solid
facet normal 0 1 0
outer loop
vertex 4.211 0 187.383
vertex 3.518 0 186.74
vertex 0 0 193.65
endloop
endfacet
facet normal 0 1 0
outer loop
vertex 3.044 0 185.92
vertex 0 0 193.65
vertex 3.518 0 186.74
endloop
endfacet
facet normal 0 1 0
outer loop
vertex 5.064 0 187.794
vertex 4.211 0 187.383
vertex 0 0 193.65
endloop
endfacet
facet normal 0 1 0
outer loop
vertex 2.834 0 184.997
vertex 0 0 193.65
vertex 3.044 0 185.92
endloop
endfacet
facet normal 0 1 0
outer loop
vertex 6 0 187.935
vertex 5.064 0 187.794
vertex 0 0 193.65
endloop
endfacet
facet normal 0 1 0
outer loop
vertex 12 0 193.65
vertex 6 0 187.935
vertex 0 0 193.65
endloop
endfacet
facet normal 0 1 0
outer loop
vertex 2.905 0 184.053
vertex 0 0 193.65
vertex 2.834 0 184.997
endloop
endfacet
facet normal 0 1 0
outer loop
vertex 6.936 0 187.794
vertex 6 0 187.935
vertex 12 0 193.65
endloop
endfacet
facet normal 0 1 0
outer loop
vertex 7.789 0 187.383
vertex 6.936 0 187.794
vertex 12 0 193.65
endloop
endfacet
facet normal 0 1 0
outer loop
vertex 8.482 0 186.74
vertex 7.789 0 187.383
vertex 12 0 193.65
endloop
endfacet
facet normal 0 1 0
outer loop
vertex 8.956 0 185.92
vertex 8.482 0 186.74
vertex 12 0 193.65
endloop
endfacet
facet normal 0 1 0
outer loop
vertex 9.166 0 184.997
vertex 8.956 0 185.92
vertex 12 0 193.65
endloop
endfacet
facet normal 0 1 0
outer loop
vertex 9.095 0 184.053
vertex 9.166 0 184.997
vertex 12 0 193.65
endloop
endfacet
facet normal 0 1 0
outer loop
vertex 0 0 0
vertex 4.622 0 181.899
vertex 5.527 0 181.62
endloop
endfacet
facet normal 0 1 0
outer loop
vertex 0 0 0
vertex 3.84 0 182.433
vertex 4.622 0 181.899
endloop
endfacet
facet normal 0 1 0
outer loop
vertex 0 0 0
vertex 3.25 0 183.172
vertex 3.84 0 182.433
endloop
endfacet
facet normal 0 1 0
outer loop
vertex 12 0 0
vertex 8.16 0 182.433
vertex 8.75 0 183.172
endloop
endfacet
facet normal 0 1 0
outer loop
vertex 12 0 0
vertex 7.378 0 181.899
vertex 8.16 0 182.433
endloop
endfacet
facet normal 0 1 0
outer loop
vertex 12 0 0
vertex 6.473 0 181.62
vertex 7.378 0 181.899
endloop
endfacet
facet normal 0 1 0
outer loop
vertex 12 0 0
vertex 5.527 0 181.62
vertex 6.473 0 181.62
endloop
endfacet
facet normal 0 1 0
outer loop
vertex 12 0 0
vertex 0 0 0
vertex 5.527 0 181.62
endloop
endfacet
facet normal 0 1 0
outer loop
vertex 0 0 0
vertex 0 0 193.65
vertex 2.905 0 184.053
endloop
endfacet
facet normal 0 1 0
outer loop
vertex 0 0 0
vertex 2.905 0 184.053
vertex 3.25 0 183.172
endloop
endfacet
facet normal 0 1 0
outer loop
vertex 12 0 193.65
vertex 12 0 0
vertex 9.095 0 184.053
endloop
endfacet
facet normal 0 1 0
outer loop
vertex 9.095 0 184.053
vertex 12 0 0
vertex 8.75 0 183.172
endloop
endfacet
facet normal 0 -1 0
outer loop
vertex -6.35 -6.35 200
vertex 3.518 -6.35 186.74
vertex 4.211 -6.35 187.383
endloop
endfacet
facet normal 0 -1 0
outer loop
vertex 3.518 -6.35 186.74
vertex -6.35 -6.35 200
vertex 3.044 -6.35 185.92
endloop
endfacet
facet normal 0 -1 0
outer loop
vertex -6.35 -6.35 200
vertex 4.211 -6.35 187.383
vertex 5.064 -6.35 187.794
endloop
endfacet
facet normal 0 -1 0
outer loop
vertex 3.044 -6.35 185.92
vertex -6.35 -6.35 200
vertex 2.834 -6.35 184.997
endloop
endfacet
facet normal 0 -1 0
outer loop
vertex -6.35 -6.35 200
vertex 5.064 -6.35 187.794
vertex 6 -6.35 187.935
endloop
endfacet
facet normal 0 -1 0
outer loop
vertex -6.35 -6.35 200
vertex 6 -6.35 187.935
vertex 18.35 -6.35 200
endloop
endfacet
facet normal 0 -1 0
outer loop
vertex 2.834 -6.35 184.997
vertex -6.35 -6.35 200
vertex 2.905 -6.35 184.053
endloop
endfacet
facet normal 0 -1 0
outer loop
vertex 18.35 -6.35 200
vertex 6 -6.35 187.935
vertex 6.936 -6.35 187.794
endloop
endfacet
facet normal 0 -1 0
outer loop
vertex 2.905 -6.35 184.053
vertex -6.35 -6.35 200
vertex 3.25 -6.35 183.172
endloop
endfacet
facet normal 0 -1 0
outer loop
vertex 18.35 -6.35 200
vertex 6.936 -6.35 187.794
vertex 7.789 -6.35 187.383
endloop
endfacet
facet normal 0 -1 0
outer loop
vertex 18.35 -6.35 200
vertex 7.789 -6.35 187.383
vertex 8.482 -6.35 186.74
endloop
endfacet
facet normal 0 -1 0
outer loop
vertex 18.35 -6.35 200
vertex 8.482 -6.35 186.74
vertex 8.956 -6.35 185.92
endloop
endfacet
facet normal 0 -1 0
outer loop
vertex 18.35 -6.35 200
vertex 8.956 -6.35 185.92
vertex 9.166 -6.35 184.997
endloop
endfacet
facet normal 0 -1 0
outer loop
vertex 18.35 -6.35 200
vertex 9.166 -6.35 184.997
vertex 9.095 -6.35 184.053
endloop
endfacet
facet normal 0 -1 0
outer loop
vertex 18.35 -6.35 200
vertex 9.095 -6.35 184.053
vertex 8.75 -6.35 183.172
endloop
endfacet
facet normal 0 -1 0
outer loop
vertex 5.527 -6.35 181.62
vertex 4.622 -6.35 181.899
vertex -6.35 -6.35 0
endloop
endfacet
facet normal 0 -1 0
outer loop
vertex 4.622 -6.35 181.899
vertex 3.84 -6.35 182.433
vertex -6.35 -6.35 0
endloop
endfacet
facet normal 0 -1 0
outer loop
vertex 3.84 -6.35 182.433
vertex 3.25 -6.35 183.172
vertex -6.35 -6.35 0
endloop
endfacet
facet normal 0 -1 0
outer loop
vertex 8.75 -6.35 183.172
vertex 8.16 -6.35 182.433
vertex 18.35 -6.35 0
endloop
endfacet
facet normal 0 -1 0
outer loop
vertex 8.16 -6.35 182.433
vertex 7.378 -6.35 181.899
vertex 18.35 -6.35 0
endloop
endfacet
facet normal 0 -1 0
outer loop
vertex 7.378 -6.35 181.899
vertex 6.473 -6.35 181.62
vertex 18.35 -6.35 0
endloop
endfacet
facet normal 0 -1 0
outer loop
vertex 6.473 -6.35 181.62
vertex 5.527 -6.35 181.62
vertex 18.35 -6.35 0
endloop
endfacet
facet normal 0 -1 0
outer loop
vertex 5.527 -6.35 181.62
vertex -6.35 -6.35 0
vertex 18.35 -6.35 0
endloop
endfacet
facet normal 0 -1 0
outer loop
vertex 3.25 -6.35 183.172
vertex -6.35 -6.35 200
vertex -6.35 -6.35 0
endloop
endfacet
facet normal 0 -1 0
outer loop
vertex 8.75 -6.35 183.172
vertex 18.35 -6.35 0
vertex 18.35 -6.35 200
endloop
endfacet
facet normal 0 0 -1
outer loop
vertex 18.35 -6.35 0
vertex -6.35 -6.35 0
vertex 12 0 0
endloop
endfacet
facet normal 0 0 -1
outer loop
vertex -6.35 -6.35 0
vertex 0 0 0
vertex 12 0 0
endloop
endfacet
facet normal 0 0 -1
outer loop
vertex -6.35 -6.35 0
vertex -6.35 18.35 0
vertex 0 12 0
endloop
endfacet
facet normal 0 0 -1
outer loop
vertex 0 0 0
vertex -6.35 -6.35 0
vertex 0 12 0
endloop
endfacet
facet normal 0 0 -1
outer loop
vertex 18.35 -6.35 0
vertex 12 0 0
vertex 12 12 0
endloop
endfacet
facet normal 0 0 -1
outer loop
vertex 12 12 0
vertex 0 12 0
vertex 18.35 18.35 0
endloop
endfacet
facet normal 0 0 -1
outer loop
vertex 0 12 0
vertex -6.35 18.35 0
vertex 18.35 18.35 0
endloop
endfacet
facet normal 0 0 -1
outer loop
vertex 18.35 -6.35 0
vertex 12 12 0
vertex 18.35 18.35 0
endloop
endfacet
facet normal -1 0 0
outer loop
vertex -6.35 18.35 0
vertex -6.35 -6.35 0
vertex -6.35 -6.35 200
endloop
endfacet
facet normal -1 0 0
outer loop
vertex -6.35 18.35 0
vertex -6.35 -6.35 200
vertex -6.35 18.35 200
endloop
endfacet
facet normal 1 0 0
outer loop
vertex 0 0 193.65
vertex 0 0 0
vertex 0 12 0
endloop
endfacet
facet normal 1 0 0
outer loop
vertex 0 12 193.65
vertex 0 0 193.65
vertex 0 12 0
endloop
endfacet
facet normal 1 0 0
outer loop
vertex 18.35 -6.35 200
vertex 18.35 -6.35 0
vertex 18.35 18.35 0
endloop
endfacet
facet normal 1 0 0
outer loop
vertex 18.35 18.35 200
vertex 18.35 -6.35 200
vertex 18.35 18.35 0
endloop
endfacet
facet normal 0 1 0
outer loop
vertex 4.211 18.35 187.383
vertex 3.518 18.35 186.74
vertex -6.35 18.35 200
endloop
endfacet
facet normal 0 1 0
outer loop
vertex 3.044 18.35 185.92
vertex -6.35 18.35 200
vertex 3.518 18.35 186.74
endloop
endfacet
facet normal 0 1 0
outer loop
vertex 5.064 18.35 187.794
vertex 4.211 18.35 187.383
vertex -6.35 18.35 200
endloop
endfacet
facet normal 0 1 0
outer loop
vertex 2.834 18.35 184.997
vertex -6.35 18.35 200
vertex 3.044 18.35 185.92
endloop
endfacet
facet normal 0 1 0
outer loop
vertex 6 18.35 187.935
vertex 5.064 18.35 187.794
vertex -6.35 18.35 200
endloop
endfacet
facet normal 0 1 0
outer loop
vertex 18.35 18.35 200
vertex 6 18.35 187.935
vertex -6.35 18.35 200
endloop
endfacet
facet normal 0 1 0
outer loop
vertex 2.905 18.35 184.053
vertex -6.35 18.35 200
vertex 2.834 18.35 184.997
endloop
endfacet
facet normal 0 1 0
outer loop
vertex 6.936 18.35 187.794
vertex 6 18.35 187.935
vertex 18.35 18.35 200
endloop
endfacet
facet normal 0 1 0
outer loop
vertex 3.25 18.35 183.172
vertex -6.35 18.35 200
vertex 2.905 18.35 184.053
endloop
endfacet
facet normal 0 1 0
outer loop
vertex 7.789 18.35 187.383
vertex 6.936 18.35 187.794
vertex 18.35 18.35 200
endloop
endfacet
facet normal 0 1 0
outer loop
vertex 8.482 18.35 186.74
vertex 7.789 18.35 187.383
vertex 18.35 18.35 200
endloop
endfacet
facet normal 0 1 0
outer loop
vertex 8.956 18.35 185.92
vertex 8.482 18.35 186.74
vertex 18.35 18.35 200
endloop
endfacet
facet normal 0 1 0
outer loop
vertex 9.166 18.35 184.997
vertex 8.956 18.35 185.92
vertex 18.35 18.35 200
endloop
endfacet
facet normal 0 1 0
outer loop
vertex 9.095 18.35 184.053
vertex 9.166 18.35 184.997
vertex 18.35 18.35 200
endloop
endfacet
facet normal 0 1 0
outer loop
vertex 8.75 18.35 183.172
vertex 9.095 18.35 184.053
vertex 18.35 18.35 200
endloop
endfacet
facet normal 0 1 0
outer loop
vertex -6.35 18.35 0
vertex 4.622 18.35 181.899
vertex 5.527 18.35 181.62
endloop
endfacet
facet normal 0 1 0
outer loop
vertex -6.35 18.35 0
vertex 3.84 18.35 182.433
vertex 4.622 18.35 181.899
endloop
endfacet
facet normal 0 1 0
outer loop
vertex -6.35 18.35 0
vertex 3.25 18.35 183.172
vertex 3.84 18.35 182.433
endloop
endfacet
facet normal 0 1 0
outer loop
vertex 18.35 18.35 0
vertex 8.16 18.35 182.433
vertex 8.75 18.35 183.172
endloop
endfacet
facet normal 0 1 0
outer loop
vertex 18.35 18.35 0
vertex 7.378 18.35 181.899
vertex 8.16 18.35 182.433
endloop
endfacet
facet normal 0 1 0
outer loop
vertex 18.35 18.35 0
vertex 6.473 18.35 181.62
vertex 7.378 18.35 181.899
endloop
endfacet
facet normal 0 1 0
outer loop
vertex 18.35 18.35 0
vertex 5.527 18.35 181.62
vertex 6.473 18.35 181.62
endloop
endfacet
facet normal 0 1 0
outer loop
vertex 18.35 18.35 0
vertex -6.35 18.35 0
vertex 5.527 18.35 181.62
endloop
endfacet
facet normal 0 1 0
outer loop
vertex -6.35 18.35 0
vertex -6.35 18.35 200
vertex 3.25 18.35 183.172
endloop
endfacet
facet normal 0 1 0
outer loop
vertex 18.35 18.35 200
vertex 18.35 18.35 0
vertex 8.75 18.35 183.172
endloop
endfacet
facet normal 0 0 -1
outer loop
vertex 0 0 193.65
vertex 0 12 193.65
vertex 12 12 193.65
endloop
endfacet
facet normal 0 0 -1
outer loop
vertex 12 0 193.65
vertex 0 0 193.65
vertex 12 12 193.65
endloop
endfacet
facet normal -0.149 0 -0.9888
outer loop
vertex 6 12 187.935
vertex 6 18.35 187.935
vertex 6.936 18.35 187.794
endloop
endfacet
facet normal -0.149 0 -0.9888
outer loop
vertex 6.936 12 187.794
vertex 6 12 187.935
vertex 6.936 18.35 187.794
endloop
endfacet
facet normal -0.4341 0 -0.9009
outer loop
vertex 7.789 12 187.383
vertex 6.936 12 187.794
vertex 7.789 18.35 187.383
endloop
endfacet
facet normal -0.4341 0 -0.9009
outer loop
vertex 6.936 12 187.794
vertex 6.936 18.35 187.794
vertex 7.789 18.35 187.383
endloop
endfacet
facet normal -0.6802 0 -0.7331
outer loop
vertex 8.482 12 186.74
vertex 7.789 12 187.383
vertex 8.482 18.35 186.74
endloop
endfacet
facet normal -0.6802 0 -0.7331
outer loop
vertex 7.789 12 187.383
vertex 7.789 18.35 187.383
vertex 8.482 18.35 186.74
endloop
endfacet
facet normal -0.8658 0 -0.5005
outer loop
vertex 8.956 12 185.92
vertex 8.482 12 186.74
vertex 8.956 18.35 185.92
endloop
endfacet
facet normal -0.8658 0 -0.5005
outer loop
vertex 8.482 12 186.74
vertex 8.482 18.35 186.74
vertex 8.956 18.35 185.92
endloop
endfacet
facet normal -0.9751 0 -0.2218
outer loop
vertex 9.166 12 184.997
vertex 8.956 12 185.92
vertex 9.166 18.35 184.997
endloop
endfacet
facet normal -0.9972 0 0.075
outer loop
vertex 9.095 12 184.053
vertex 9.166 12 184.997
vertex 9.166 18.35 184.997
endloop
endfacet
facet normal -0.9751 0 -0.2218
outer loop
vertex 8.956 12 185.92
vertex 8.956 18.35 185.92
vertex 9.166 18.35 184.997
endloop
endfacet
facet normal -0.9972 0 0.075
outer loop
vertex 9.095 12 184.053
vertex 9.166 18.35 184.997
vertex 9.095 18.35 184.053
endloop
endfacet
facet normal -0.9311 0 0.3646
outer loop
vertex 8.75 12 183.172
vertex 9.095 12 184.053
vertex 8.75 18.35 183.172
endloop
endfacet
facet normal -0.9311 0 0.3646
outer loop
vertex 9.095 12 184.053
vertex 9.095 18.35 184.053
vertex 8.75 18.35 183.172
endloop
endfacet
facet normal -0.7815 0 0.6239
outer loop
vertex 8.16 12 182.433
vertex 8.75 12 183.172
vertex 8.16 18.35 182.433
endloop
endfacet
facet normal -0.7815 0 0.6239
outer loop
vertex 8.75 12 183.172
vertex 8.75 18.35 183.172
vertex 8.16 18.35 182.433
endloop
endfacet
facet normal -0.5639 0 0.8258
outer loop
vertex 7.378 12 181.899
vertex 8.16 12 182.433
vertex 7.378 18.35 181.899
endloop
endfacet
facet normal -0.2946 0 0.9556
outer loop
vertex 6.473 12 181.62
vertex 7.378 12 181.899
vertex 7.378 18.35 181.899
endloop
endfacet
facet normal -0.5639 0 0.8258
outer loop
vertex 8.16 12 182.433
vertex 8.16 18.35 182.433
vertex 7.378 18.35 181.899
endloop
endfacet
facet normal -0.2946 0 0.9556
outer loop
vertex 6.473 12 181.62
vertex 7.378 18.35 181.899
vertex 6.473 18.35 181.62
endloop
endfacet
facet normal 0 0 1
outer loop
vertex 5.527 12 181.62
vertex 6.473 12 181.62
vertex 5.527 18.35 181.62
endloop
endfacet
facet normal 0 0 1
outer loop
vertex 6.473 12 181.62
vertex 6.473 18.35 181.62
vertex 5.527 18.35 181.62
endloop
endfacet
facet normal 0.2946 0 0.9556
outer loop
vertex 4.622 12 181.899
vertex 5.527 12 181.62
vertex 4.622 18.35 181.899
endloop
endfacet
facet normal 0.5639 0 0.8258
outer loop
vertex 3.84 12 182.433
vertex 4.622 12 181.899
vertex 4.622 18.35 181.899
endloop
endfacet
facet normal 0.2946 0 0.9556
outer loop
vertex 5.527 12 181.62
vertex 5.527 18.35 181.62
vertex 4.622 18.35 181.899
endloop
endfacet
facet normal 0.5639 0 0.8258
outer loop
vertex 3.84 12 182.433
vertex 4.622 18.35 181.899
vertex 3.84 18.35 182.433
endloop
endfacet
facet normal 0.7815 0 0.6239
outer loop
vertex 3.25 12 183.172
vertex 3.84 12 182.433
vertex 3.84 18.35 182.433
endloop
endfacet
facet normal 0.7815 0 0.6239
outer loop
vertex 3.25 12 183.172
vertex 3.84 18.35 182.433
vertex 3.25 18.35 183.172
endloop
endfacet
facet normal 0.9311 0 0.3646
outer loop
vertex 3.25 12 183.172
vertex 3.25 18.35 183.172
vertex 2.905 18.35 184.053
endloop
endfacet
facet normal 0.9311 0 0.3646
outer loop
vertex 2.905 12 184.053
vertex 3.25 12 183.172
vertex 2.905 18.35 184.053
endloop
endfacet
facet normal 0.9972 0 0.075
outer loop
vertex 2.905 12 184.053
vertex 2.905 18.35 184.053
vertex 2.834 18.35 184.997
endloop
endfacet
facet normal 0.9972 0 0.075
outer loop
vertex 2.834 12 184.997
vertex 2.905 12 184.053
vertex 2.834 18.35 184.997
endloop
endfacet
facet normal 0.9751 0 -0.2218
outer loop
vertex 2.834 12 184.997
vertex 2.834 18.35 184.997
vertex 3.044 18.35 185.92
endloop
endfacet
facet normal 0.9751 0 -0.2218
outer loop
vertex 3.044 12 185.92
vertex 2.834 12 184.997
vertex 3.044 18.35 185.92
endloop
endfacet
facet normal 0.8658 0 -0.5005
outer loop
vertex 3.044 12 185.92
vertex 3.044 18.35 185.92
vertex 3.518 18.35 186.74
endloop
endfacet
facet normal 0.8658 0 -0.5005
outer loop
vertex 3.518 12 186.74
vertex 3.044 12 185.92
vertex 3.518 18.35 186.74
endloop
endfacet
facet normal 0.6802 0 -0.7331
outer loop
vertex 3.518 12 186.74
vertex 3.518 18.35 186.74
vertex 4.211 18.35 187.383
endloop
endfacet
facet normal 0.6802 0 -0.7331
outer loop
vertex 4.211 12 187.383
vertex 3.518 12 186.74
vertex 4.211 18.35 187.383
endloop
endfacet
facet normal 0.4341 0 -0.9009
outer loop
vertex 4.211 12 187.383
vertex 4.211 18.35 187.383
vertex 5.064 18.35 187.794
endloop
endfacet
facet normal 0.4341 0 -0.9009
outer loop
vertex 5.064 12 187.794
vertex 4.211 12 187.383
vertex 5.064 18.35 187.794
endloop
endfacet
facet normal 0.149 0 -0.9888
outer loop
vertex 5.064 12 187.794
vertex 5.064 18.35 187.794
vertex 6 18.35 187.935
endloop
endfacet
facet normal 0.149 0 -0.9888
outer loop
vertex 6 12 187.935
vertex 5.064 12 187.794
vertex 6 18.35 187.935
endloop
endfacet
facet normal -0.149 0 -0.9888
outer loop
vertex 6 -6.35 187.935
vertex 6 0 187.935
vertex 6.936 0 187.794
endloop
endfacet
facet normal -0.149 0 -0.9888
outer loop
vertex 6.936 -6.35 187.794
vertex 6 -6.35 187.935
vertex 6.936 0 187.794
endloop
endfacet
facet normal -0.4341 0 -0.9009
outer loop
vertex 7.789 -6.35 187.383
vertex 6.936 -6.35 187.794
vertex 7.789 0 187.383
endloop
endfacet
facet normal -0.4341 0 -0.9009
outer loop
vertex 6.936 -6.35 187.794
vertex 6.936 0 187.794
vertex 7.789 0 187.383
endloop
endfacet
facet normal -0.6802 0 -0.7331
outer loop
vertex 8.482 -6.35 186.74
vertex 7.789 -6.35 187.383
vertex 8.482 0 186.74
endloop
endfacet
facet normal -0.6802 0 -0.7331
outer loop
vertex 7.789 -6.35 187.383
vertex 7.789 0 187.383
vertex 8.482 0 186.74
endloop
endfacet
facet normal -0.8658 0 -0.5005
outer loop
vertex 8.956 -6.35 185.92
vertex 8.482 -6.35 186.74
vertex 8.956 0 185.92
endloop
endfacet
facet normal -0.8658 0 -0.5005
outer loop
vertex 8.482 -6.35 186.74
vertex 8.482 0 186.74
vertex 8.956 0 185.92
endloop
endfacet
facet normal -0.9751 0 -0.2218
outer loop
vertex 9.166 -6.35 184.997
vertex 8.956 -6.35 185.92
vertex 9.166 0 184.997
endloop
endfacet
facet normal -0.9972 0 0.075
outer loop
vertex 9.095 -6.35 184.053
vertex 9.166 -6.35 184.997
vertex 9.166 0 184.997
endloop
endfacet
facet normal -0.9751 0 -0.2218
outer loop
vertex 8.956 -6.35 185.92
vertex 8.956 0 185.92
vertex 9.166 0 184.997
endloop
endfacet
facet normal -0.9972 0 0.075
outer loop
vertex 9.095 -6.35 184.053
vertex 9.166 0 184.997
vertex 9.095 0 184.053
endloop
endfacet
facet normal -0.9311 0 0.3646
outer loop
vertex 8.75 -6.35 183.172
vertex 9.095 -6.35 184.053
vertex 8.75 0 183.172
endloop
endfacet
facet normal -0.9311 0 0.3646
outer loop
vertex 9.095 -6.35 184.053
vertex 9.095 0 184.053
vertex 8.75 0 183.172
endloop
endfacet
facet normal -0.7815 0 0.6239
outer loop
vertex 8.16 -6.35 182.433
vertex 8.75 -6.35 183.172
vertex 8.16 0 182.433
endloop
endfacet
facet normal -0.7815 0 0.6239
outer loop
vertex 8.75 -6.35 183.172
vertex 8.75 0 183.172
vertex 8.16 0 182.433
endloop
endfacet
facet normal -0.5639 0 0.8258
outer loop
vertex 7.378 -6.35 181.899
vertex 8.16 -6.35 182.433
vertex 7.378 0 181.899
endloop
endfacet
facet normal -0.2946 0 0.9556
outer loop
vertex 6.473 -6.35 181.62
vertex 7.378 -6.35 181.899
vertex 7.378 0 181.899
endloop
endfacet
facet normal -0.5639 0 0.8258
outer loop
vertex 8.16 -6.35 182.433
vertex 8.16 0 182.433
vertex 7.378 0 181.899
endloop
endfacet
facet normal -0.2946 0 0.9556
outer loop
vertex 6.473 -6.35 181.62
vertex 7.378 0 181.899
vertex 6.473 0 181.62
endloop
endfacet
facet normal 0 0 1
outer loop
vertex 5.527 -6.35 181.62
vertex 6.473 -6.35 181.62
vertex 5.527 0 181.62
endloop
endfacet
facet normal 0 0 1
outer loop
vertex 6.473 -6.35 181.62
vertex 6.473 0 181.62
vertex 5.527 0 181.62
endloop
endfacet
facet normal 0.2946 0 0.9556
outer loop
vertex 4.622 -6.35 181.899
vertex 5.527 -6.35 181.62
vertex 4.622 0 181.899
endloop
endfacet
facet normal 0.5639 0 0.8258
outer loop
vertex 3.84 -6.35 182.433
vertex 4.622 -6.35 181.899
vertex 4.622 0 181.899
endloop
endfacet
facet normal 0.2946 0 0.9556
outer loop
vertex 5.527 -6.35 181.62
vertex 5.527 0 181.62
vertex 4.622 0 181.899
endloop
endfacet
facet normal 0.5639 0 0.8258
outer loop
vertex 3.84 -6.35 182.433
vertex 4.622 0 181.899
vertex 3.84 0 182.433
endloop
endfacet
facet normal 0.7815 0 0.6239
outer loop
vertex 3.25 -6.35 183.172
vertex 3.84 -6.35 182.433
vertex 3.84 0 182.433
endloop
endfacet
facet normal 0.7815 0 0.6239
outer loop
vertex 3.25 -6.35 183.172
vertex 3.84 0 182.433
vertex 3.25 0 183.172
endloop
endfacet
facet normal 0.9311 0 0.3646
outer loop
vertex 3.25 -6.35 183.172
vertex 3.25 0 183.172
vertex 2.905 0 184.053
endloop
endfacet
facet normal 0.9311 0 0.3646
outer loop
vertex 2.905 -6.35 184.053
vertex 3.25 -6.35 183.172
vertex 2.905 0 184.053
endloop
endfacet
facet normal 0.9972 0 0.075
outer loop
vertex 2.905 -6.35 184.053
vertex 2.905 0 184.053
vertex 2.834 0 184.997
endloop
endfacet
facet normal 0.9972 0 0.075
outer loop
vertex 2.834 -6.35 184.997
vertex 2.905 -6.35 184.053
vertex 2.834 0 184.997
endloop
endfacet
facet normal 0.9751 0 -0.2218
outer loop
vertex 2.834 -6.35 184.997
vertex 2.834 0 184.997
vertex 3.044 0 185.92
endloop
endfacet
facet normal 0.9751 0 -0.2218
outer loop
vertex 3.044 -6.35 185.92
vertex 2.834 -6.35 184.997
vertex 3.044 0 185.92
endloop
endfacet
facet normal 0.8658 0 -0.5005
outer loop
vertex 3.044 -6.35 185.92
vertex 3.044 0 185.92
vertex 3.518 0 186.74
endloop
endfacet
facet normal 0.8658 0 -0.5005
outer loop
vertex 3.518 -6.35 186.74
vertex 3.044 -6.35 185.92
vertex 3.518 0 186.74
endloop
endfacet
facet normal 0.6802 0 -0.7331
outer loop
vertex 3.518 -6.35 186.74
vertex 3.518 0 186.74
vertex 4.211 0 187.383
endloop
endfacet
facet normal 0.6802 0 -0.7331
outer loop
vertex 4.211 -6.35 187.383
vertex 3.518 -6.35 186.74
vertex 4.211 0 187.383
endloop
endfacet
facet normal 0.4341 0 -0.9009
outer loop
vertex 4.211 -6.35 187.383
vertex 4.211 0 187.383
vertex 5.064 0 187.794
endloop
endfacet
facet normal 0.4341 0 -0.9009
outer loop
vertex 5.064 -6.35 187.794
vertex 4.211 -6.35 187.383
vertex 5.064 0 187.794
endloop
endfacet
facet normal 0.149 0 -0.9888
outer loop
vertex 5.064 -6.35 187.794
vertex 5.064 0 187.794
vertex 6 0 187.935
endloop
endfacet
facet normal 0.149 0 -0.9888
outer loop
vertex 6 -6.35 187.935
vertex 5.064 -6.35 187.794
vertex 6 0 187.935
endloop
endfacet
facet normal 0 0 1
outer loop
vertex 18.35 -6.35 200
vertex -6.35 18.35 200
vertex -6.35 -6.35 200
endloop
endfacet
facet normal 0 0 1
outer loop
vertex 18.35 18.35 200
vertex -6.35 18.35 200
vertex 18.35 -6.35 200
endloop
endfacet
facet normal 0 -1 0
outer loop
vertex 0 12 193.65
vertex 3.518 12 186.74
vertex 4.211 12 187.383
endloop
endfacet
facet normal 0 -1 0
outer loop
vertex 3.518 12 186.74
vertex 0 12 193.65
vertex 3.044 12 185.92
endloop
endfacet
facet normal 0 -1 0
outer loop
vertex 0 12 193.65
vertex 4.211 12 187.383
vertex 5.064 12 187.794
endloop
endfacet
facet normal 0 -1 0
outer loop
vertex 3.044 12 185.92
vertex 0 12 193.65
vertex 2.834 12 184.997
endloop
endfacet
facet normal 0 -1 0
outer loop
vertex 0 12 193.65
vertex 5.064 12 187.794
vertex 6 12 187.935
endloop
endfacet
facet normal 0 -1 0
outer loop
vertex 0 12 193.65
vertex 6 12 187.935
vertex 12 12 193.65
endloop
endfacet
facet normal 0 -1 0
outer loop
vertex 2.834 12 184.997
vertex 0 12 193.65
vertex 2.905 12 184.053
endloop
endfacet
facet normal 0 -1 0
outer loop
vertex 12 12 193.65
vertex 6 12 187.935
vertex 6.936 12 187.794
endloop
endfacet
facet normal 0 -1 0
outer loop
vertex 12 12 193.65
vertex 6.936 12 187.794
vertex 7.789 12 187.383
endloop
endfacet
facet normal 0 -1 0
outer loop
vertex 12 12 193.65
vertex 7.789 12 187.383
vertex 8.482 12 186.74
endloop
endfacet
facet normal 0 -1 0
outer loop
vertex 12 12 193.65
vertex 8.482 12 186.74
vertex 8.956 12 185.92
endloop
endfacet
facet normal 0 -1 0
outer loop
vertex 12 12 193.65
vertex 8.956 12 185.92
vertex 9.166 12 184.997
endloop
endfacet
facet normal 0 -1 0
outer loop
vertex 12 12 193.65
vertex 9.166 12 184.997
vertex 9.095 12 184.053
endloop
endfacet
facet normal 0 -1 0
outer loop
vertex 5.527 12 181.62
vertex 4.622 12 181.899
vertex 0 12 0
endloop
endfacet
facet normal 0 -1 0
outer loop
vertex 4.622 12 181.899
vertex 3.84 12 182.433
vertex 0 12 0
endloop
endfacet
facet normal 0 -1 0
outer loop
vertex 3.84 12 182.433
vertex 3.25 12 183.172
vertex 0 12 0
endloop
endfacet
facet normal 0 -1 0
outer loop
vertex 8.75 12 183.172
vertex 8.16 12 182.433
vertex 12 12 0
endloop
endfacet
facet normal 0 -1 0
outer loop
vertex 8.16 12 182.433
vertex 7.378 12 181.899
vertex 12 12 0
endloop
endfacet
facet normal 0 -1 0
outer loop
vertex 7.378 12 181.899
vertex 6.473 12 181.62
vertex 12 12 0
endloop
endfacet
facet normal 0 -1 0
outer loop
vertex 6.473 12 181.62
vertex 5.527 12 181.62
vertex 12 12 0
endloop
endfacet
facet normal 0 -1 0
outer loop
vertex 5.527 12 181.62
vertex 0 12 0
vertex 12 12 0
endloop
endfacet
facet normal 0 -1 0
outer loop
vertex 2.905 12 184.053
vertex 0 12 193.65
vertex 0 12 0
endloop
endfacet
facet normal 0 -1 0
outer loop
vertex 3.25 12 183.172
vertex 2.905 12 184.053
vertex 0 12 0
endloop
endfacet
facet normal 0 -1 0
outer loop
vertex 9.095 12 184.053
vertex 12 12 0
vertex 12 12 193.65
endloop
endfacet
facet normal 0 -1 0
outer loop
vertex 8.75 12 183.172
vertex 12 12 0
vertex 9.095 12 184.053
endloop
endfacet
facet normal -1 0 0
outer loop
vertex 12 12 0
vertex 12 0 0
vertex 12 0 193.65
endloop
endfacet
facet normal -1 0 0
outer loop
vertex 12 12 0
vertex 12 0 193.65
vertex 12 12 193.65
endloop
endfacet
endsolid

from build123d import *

# Parameters (mm, degrees)
SKETCH1_W           = 24.7
SKETCH1_H           = 24.7
BOSS_EXTRUDE1_DEPTH = 200
SKETCH1_4_W         = 12
SKETCH1_4_H         = 12
CUT_EXTRUDE1_DEPTH  = 193.65
SKETCH2_R           = 3.175
CUT_EXTRUDE2_DEPTH  = 203.353187521


with BuildPart() as part:
    # Sketch1 → Boss-Extrude1 (new body)
    with BuildSketch(Plane.XY):
        with Locations((6, 6)):
            Rectangle(SKETCH1_W, SKETCH1_H)
    extrude(amount=BOSS_EXTRUDE1_DEPTH)

    # Sketch1<4> → Cut-Extrude1 (cut)
    with BuildSketch(Plane.XY):
        with Locations((6, 6)):
            Rectangle(SKETCH1_4_W, SKETCH1_4_H)
    extrude(amount=CUT_EXTRUDE1_DEPTH, mode=Mode.SUBTRACT)

    # Sketch2 → Cut-Extrude2 (cut, through all)
    with BuildSketch(Plane(origin=(0, 18.35, 0), x_dir=(1, 0, 0), z_dir=(0, 1, 0))):
        with Locations(Location((6, -184.76, 0), (0, 0, 270))):
            Circle(SKETCH2_R)
    extrude(amount=-CUT_EXTRUDE2_DEPTH, mode=Mode.SUBTRACT)


solid = part.part
